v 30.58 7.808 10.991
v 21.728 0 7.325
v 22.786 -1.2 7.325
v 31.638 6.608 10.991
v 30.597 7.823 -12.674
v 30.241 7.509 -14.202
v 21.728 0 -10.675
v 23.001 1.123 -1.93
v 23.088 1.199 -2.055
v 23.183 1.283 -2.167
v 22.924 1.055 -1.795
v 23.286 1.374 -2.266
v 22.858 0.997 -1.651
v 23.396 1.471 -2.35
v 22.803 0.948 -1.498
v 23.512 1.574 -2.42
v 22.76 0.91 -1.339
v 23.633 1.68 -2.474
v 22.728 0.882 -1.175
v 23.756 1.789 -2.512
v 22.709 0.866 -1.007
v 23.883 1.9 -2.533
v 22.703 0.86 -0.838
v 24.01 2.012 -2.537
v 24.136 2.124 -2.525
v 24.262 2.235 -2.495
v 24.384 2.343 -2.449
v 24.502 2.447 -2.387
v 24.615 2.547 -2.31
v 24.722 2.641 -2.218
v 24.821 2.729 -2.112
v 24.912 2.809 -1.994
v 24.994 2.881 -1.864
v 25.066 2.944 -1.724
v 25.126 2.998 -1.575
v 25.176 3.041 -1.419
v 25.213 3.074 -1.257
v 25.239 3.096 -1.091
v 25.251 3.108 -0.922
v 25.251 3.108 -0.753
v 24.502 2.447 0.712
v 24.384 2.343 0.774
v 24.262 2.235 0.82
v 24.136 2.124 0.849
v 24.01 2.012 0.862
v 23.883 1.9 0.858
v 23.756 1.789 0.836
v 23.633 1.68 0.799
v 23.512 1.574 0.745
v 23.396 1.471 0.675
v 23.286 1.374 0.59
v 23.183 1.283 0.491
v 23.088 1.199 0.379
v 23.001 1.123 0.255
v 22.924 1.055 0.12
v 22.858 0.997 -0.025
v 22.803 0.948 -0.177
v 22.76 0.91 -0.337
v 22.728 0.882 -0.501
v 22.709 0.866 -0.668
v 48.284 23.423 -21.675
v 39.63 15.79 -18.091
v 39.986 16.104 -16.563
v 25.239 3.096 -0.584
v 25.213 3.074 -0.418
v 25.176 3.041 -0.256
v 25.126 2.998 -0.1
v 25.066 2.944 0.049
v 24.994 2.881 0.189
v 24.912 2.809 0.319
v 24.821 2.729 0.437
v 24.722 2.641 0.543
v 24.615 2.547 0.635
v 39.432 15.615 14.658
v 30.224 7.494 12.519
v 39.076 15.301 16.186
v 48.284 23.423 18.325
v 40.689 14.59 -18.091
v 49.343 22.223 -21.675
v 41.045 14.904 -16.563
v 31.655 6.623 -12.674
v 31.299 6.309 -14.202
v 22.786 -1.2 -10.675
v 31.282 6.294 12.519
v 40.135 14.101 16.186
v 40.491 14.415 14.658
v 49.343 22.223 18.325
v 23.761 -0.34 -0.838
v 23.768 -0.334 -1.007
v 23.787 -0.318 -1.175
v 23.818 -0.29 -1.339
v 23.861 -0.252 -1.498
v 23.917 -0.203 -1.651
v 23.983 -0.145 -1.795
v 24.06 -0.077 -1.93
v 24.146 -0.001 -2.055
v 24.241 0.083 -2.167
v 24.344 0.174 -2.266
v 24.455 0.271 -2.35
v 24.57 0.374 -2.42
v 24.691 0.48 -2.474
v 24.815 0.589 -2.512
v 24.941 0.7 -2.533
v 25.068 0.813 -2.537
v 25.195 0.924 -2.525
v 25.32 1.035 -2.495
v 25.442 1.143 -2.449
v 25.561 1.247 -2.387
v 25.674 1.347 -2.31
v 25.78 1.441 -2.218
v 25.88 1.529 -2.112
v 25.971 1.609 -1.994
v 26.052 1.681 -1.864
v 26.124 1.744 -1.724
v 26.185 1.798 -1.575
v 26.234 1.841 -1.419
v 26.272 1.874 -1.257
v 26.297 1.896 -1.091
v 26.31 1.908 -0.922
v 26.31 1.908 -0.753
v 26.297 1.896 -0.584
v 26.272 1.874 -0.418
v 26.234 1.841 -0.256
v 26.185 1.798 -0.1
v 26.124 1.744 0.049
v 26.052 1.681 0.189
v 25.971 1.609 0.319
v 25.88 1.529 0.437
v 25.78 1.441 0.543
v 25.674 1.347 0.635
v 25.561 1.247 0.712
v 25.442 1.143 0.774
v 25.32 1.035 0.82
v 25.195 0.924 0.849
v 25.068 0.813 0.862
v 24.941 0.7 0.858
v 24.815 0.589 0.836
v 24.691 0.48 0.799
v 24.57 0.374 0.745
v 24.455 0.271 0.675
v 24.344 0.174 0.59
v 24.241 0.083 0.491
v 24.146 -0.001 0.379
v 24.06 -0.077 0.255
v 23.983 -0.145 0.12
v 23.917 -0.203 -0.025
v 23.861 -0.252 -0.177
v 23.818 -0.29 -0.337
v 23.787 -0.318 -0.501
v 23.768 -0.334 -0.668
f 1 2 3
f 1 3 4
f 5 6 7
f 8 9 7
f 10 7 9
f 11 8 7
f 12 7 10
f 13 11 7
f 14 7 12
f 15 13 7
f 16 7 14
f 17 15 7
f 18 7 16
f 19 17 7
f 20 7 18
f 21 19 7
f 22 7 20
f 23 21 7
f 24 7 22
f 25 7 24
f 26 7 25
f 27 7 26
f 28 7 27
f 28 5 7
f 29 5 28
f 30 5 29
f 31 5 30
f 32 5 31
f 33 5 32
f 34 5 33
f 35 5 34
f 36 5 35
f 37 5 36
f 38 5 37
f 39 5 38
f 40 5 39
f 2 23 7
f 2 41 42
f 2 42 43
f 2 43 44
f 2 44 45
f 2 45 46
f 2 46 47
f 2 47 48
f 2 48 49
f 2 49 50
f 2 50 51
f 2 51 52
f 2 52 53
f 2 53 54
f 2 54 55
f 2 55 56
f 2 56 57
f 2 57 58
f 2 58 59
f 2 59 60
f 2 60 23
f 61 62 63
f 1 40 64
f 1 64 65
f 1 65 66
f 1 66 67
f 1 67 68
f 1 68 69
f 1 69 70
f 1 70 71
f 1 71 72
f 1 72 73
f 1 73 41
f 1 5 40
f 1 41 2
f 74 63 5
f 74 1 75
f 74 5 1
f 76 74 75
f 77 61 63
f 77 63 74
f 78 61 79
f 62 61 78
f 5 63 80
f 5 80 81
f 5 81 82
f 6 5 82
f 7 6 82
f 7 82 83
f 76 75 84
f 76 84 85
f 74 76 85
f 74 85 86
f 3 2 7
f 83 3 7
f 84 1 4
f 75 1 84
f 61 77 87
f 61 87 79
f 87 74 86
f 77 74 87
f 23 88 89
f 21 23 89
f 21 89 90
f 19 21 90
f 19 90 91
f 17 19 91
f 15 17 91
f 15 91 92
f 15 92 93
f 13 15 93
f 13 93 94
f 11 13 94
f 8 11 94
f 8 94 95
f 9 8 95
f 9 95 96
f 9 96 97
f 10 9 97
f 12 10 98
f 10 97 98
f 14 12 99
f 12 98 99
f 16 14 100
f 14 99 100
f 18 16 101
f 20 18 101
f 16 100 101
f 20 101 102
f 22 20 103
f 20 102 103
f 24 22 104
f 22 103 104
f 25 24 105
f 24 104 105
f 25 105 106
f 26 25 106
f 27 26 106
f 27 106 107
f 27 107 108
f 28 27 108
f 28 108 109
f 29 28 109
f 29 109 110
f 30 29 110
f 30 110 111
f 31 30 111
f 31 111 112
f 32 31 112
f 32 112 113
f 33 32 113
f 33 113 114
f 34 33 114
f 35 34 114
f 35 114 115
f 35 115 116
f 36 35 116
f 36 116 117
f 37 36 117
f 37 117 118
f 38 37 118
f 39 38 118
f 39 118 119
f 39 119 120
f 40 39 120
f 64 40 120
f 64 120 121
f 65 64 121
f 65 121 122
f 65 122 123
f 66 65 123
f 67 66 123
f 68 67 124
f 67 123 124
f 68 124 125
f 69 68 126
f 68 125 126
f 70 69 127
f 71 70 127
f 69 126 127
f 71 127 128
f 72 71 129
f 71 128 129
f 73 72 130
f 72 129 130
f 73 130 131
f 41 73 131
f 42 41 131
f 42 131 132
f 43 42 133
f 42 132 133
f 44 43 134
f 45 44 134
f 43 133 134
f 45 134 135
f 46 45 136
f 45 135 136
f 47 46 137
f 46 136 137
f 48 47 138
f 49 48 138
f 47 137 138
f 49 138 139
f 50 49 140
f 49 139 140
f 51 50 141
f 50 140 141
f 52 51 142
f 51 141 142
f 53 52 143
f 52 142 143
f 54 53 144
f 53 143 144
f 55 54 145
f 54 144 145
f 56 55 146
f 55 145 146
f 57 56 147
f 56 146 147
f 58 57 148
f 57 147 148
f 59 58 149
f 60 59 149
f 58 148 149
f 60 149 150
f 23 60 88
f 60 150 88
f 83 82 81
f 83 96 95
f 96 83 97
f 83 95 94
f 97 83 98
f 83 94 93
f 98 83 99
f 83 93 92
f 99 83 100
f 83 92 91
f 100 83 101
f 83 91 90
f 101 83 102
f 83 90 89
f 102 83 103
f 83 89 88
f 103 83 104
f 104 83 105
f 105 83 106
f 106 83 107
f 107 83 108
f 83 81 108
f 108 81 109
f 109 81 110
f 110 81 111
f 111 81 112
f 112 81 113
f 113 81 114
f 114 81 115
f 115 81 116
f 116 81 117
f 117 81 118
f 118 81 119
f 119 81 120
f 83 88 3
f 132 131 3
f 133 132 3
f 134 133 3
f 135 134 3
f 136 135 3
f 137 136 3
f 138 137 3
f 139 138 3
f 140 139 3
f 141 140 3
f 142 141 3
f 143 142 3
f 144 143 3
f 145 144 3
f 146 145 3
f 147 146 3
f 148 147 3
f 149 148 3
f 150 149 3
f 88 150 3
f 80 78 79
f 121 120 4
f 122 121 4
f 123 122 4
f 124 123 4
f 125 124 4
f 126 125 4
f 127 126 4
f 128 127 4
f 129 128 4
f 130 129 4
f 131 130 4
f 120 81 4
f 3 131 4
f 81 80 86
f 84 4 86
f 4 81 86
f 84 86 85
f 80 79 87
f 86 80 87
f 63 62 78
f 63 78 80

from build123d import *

# Parameters (mm, degrees)
BOSS_EXTRUDE1_DEPTH  = 1.6
M3_CLEARANCE_HOLE1_D = 3.4


with BuildPart() as part:
    # Sketch5 → Boss-Extrude1 (new body)
    with BuildSketch(Plane(origin=(9.507139376, -10.778899957, 0), x_dir=(0, 0, -1), z_dir=(0.6614786524658173, -0.7499639940237175, 0))):
        Polygon((-18.324577301, 51.705324763), (21.675422699, 51.705324763), (18.090793802, 40.16602452), (16.562821188, 40.640681966), (12.673658844, 28.121056286), (14.201631457, 27.64639884), (10.675422699, 16.295159211), (9, 16.295159211), (-7.324577301, 16.295159211), (-10.991243968, 28.098547728), (-12.519216582, 27.623890282), (-16.185883249, 39.427278799), (-14.657910635, 39.901936245), align=None)
    extrude(amount=BOSS_EXTRUDE1_DEPTH)

    # M3 Clearance Hole1 (through all)
    with Locations(Plane(origin=(9.507139376, -10.778899957, 0), x_dir=(0.7499639940237175, 0.6614786524658175, 0), z_dir=(-0.6614786524658175, 0.7499639940237175, 0))):
        with Locations((19.295159211, 0.837711349)):
            Hole(M3_CLEARANCE_HOLE1_D / 2)


solid = part.part
